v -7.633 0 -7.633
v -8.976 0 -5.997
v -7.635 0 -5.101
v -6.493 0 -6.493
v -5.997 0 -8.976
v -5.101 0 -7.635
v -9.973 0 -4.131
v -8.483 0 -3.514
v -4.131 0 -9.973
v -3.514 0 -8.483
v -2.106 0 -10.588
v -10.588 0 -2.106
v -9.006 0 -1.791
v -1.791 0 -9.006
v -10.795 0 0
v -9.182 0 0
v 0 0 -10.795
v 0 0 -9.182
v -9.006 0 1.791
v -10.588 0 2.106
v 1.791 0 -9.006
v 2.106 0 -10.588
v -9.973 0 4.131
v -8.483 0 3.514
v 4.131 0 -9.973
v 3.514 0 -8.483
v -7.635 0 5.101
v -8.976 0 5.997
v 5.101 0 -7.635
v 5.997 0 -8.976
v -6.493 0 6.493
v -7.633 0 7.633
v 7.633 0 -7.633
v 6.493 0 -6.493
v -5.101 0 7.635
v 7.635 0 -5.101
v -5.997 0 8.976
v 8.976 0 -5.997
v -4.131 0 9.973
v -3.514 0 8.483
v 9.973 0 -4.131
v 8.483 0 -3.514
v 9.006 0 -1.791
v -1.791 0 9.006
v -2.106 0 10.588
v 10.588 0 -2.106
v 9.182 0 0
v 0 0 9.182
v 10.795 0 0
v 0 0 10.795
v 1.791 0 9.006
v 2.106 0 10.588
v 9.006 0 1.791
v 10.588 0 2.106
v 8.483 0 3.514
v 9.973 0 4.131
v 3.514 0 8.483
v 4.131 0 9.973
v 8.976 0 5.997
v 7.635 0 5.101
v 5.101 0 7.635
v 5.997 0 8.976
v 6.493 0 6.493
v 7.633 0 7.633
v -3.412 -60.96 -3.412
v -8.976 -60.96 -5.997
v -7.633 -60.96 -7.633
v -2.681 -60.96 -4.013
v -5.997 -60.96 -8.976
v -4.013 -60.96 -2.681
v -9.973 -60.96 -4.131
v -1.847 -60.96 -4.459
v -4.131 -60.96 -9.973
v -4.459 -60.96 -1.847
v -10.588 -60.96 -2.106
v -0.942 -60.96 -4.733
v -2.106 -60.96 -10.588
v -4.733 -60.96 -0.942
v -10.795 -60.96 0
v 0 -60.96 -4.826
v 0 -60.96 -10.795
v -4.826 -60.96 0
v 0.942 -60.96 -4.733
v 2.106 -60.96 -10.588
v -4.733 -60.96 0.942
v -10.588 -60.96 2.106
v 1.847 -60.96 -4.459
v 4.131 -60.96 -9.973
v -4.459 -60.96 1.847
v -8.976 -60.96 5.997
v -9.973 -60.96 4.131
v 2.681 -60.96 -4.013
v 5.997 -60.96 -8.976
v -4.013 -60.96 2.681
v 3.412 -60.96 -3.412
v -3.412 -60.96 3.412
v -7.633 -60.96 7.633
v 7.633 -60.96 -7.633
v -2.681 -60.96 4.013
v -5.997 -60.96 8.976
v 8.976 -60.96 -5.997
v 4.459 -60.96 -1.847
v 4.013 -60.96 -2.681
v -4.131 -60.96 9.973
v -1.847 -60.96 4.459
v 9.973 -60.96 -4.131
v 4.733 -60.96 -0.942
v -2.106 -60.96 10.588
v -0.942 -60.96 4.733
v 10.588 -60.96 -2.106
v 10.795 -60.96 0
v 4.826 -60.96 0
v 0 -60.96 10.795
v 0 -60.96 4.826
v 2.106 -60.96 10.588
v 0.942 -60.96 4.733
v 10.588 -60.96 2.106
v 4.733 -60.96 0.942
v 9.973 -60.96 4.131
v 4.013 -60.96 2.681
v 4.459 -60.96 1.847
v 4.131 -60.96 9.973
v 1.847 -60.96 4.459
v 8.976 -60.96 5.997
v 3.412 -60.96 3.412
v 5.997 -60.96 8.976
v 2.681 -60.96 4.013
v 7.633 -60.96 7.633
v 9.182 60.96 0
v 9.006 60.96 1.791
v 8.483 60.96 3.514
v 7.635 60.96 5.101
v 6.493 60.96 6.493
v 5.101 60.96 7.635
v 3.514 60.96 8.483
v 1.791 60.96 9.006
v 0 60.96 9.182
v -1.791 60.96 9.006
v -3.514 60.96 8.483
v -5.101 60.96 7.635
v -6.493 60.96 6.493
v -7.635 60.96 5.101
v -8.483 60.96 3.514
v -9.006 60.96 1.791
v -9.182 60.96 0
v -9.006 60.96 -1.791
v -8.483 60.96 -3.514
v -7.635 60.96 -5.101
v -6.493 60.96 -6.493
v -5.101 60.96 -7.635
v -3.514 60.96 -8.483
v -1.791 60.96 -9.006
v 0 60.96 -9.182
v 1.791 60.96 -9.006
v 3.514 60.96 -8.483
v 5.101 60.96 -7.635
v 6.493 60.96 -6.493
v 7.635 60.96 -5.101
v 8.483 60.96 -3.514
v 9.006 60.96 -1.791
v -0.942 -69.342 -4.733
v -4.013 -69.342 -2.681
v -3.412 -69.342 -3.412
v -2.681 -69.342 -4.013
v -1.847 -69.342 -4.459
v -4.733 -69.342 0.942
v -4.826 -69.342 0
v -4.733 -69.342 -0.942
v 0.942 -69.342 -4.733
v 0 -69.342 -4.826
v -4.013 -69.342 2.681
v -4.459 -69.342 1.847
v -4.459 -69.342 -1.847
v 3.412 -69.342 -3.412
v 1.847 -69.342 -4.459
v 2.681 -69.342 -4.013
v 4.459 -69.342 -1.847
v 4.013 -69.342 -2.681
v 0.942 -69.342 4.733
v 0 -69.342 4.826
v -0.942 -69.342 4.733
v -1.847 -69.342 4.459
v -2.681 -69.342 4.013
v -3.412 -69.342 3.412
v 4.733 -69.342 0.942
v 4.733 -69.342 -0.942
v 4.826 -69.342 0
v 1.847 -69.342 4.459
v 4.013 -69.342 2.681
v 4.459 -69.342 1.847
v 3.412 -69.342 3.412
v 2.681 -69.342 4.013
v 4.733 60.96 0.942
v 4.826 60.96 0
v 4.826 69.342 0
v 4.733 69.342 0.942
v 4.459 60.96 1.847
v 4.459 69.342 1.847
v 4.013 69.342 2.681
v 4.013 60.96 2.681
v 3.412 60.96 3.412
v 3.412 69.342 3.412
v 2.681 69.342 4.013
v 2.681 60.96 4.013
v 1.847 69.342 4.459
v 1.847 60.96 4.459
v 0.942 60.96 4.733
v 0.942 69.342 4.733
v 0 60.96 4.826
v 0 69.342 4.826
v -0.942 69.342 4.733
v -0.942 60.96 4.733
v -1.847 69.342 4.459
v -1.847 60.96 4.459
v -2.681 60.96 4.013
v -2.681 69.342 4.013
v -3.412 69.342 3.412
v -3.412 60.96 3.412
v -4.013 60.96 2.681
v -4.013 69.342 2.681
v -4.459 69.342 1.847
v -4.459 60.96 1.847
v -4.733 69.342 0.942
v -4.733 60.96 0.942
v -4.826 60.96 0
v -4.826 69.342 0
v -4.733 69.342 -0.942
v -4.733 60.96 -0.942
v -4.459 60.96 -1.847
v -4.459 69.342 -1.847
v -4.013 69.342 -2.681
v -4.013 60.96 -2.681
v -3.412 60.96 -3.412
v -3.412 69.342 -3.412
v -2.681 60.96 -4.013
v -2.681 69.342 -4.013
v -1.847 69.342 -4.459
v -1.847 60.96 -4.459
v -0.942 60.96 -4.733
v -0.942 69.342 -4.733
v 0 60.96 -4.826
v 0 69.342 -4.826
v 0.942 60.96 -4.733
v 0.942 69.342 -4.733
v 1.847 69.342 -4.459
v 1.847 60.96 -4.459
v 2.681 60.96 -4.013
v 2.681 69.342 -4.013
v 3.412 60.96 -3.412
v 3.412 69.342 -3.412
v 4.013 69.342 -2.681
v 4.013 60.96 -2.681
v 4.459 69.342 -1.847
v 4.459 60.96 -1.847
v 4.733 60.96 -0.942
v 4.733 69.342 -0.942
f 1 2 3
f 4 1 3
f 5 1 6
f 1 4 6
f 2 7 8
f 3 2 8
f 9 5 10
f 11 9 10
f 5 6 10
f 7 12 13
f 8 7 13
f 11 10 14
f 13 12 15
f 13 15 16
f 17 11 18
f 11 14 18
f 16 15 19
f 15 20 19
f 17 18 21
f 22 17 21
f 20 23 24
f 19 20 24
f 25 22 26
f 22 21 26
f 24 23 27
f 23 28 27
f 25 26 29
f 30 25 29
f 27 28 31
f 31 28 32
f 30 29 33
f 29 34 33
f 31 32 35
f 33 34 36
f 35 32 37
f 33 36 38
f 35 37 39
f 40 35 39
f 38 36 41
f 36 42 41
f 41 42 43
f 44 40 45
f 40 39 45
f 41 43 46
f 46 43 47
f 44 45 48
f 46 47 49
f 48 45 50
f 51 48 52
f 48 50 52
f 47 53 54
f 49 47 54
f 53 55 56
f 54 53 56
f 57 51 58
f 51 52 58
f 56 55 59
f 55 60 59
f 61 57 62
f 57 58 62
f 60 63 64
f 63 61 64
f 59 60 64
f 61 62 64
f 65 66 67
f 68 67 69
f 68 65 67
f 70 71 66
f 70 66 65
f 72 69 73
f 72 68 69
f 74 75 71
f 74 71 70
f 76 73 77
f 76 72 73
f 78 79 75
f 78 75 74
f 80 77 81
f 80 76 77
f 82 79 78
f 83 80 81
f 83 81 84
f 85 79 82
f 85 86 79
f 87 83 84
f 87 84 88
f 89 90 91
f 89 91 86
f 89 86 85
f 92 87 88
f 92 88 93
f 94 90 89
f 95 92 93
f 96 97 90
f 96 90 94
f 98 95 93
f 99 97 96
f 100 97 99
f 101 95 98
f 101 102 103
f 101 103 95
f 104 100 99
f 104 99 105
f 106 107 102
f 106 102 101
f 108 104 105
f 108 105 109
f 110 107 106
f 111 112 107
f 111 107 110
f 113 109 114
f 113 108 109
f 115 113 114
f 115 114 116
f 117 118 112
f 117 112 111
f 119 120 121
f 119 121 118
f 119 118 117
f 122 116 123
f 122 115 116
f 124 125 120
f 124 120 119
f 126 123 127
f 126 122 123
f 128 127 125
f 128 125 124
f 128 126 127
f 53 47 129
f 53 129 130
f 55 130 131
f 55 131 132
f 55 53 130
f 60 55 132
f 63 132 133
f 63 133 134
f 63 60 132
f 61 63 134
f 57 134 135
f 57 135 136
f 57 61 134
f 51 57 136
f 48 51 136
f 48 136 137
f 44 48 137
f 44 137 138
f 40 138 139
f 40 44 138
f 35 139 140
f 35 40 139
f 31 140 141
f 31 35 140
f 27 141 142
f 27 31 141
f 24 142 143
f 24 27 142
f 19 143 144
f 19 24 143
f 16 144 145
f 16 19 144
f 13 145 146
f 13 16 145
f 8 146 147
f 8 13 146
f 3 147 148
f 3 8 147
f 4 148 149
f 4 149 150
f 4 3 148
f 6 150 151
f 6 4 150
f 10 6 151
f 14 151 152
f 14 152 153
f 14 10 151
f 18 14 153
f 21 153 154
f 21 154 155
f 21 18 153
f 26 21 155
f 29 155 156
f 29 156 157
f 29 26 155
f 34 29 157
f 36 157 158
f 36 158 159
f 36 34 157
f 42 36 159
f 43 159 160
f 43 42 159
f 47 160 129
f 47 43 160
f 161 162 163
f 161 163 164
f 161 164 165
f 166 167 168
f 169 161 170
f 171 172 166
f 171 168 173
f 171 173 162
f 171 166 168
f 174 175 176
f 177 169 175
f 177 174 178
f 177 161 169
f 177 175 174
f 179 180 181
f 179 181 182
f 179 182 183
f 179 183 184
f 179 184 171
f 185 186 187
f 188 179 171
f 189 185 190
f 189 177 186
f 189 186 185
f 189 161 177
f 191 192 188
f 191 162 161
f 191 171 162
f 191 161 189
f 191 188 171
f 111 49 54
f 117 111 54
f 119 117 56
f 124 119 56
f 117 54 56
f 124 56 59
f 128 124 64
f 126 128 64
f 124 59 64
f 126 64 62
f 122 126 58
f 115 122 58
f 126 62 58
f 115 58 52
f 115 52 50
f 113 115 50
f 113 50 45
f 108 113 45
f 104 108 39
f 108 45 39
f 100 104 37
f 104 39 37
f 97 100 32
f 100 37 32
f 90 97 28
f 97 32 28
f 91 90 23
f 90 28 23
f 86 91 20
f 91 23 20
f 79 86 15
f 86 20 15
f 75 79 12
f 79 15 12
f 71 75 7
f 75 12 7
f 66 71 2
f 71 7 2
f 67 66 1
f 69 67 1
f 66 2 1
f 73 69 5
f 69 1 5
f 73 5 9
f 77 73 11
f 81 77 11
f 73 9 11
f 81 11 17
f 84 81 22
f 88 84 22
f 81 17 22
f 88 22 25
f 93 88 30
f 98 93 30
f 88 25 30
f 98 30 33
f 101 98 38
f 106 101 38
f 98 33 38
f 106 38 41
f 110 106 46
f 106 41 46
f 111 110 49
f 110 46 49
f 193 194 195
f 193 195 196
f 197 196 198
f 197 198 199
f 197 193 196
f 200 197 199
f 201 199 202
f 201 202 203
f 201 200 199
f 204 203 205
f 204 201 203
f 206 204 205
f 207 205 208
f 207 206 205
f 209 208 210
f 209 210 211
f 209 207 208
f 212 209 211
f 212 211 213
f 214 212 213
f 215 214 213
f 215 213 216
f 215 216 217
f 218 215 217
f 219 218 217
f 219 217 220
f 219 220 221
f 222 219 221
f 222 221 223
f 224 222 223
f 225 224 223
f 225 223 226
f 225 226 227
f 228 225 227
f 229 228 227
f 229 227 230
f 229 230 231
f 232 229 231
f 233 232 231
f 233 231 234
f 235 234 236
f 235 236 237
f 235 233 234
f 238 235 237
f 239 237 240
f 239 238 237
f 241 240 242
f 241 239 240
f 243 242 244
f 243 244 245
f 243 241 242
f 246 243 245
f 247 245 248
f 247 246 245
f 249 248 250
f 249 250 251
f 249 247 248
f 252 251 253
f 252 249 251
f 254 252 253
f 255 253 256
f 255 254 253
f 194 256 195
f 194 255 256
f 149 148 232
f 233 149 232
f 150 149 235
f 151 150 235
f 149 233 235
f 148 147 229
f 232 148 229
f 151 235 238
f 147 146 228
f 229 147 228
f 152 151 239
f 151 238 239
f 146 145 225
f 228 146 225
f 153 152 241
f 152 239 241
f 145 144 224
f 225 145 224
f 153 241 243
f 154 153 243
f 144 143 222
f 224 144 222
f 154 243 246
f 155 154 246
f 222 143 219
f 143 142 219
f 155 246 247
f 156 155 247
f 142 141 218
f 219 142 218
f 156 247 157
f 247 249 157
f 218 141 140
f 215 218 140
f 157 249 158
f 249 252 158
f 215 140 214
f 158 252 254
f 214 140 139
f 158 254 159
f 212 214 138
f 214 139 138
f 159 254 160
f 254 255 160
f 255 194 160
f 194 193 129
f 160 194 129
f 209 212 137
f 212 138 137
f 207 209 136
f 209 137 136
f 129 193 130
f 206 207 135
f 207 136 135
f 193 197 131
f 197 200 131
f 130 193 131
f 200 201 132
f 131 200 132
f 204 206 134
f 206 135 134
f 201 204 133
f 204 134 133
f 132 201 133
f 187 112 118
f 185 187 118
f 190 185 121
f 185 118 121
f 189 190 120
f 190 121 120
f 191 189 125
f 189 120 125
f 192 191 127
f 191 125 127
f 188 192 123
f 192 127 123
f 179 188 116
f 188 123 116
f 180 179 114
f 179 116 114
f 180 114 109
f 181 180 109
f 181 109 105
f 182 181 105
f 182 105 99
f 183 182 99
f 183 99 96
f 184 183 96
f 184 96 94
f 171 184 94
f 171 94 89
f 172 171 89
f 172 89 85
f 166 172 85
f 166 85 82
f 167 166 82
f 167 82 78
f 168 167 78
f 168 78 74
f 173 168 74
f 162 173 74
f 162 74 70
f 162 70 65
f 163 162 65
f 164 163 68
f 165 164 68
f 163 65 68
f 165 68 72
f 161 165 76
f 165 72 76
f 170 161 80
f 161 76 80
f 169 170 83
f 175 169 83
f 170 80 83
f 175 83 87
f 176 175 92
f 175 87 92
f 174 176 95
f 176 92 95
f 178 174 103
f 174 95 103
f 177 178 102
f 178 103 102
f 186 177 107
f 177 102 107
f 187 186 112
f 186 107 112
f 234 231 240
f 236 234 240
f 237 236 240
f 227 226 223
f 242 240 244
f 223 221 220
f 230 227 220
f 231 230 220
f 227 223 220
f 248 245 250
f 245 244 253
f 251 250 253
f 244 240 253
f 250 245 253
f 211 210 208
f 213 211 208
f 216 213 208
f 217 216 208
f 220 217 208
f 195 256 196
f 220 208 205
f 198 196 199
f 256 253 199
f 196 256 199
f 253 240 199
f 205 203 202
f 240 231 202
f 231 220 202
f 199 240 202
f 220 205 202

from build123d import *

# Parameters (mm, degrees)
F0_R     = 10.795
F0_R_2   = 9.1821
F0_R_3   = 4.826
F1_DEPTH = 60.96
F2_DEPTH = 69.342
F3_DEPTH = 60.96
F4_DEPTH = 69.342


with BuildPart() as f1:
    # F0 (on Front) → F1 (new body)
    with BuildSketch(Plane.XZ):
        Circle(F0_R)
        Circle(F0_R_2, mode=Mode.SUBTRACT)
        Circle(F0_R_2)
        Circle(F0_R_3, mode=Mode.SUBTRACT)
        Circle(F0_R_3)
    extrude(amount=F1_DEPTH)

    # F0 (on Front) → F2 (join)
    with BuildSketch(Plane.XZ):
        Circle(F0_R_3)
    extrude(amount=F2_DEPTH)

    # F0 (on Front) → F3 (join)
    with BuildSketch(Plane.XZ):
        Circle(F0_R_2)
        Circle(F0_R_3, mode=Mode.SUBTRACT)
        Circle(F0_R_3)
    extrude(amount=-F3_DEPTH)

    # F0 (on Front) → F4 (join)
    with BuildSketch(Plane.XZ):
        Circle(F0_R_3)
    extrude(amount=-F4_DEPTH)


solid = f1.part
